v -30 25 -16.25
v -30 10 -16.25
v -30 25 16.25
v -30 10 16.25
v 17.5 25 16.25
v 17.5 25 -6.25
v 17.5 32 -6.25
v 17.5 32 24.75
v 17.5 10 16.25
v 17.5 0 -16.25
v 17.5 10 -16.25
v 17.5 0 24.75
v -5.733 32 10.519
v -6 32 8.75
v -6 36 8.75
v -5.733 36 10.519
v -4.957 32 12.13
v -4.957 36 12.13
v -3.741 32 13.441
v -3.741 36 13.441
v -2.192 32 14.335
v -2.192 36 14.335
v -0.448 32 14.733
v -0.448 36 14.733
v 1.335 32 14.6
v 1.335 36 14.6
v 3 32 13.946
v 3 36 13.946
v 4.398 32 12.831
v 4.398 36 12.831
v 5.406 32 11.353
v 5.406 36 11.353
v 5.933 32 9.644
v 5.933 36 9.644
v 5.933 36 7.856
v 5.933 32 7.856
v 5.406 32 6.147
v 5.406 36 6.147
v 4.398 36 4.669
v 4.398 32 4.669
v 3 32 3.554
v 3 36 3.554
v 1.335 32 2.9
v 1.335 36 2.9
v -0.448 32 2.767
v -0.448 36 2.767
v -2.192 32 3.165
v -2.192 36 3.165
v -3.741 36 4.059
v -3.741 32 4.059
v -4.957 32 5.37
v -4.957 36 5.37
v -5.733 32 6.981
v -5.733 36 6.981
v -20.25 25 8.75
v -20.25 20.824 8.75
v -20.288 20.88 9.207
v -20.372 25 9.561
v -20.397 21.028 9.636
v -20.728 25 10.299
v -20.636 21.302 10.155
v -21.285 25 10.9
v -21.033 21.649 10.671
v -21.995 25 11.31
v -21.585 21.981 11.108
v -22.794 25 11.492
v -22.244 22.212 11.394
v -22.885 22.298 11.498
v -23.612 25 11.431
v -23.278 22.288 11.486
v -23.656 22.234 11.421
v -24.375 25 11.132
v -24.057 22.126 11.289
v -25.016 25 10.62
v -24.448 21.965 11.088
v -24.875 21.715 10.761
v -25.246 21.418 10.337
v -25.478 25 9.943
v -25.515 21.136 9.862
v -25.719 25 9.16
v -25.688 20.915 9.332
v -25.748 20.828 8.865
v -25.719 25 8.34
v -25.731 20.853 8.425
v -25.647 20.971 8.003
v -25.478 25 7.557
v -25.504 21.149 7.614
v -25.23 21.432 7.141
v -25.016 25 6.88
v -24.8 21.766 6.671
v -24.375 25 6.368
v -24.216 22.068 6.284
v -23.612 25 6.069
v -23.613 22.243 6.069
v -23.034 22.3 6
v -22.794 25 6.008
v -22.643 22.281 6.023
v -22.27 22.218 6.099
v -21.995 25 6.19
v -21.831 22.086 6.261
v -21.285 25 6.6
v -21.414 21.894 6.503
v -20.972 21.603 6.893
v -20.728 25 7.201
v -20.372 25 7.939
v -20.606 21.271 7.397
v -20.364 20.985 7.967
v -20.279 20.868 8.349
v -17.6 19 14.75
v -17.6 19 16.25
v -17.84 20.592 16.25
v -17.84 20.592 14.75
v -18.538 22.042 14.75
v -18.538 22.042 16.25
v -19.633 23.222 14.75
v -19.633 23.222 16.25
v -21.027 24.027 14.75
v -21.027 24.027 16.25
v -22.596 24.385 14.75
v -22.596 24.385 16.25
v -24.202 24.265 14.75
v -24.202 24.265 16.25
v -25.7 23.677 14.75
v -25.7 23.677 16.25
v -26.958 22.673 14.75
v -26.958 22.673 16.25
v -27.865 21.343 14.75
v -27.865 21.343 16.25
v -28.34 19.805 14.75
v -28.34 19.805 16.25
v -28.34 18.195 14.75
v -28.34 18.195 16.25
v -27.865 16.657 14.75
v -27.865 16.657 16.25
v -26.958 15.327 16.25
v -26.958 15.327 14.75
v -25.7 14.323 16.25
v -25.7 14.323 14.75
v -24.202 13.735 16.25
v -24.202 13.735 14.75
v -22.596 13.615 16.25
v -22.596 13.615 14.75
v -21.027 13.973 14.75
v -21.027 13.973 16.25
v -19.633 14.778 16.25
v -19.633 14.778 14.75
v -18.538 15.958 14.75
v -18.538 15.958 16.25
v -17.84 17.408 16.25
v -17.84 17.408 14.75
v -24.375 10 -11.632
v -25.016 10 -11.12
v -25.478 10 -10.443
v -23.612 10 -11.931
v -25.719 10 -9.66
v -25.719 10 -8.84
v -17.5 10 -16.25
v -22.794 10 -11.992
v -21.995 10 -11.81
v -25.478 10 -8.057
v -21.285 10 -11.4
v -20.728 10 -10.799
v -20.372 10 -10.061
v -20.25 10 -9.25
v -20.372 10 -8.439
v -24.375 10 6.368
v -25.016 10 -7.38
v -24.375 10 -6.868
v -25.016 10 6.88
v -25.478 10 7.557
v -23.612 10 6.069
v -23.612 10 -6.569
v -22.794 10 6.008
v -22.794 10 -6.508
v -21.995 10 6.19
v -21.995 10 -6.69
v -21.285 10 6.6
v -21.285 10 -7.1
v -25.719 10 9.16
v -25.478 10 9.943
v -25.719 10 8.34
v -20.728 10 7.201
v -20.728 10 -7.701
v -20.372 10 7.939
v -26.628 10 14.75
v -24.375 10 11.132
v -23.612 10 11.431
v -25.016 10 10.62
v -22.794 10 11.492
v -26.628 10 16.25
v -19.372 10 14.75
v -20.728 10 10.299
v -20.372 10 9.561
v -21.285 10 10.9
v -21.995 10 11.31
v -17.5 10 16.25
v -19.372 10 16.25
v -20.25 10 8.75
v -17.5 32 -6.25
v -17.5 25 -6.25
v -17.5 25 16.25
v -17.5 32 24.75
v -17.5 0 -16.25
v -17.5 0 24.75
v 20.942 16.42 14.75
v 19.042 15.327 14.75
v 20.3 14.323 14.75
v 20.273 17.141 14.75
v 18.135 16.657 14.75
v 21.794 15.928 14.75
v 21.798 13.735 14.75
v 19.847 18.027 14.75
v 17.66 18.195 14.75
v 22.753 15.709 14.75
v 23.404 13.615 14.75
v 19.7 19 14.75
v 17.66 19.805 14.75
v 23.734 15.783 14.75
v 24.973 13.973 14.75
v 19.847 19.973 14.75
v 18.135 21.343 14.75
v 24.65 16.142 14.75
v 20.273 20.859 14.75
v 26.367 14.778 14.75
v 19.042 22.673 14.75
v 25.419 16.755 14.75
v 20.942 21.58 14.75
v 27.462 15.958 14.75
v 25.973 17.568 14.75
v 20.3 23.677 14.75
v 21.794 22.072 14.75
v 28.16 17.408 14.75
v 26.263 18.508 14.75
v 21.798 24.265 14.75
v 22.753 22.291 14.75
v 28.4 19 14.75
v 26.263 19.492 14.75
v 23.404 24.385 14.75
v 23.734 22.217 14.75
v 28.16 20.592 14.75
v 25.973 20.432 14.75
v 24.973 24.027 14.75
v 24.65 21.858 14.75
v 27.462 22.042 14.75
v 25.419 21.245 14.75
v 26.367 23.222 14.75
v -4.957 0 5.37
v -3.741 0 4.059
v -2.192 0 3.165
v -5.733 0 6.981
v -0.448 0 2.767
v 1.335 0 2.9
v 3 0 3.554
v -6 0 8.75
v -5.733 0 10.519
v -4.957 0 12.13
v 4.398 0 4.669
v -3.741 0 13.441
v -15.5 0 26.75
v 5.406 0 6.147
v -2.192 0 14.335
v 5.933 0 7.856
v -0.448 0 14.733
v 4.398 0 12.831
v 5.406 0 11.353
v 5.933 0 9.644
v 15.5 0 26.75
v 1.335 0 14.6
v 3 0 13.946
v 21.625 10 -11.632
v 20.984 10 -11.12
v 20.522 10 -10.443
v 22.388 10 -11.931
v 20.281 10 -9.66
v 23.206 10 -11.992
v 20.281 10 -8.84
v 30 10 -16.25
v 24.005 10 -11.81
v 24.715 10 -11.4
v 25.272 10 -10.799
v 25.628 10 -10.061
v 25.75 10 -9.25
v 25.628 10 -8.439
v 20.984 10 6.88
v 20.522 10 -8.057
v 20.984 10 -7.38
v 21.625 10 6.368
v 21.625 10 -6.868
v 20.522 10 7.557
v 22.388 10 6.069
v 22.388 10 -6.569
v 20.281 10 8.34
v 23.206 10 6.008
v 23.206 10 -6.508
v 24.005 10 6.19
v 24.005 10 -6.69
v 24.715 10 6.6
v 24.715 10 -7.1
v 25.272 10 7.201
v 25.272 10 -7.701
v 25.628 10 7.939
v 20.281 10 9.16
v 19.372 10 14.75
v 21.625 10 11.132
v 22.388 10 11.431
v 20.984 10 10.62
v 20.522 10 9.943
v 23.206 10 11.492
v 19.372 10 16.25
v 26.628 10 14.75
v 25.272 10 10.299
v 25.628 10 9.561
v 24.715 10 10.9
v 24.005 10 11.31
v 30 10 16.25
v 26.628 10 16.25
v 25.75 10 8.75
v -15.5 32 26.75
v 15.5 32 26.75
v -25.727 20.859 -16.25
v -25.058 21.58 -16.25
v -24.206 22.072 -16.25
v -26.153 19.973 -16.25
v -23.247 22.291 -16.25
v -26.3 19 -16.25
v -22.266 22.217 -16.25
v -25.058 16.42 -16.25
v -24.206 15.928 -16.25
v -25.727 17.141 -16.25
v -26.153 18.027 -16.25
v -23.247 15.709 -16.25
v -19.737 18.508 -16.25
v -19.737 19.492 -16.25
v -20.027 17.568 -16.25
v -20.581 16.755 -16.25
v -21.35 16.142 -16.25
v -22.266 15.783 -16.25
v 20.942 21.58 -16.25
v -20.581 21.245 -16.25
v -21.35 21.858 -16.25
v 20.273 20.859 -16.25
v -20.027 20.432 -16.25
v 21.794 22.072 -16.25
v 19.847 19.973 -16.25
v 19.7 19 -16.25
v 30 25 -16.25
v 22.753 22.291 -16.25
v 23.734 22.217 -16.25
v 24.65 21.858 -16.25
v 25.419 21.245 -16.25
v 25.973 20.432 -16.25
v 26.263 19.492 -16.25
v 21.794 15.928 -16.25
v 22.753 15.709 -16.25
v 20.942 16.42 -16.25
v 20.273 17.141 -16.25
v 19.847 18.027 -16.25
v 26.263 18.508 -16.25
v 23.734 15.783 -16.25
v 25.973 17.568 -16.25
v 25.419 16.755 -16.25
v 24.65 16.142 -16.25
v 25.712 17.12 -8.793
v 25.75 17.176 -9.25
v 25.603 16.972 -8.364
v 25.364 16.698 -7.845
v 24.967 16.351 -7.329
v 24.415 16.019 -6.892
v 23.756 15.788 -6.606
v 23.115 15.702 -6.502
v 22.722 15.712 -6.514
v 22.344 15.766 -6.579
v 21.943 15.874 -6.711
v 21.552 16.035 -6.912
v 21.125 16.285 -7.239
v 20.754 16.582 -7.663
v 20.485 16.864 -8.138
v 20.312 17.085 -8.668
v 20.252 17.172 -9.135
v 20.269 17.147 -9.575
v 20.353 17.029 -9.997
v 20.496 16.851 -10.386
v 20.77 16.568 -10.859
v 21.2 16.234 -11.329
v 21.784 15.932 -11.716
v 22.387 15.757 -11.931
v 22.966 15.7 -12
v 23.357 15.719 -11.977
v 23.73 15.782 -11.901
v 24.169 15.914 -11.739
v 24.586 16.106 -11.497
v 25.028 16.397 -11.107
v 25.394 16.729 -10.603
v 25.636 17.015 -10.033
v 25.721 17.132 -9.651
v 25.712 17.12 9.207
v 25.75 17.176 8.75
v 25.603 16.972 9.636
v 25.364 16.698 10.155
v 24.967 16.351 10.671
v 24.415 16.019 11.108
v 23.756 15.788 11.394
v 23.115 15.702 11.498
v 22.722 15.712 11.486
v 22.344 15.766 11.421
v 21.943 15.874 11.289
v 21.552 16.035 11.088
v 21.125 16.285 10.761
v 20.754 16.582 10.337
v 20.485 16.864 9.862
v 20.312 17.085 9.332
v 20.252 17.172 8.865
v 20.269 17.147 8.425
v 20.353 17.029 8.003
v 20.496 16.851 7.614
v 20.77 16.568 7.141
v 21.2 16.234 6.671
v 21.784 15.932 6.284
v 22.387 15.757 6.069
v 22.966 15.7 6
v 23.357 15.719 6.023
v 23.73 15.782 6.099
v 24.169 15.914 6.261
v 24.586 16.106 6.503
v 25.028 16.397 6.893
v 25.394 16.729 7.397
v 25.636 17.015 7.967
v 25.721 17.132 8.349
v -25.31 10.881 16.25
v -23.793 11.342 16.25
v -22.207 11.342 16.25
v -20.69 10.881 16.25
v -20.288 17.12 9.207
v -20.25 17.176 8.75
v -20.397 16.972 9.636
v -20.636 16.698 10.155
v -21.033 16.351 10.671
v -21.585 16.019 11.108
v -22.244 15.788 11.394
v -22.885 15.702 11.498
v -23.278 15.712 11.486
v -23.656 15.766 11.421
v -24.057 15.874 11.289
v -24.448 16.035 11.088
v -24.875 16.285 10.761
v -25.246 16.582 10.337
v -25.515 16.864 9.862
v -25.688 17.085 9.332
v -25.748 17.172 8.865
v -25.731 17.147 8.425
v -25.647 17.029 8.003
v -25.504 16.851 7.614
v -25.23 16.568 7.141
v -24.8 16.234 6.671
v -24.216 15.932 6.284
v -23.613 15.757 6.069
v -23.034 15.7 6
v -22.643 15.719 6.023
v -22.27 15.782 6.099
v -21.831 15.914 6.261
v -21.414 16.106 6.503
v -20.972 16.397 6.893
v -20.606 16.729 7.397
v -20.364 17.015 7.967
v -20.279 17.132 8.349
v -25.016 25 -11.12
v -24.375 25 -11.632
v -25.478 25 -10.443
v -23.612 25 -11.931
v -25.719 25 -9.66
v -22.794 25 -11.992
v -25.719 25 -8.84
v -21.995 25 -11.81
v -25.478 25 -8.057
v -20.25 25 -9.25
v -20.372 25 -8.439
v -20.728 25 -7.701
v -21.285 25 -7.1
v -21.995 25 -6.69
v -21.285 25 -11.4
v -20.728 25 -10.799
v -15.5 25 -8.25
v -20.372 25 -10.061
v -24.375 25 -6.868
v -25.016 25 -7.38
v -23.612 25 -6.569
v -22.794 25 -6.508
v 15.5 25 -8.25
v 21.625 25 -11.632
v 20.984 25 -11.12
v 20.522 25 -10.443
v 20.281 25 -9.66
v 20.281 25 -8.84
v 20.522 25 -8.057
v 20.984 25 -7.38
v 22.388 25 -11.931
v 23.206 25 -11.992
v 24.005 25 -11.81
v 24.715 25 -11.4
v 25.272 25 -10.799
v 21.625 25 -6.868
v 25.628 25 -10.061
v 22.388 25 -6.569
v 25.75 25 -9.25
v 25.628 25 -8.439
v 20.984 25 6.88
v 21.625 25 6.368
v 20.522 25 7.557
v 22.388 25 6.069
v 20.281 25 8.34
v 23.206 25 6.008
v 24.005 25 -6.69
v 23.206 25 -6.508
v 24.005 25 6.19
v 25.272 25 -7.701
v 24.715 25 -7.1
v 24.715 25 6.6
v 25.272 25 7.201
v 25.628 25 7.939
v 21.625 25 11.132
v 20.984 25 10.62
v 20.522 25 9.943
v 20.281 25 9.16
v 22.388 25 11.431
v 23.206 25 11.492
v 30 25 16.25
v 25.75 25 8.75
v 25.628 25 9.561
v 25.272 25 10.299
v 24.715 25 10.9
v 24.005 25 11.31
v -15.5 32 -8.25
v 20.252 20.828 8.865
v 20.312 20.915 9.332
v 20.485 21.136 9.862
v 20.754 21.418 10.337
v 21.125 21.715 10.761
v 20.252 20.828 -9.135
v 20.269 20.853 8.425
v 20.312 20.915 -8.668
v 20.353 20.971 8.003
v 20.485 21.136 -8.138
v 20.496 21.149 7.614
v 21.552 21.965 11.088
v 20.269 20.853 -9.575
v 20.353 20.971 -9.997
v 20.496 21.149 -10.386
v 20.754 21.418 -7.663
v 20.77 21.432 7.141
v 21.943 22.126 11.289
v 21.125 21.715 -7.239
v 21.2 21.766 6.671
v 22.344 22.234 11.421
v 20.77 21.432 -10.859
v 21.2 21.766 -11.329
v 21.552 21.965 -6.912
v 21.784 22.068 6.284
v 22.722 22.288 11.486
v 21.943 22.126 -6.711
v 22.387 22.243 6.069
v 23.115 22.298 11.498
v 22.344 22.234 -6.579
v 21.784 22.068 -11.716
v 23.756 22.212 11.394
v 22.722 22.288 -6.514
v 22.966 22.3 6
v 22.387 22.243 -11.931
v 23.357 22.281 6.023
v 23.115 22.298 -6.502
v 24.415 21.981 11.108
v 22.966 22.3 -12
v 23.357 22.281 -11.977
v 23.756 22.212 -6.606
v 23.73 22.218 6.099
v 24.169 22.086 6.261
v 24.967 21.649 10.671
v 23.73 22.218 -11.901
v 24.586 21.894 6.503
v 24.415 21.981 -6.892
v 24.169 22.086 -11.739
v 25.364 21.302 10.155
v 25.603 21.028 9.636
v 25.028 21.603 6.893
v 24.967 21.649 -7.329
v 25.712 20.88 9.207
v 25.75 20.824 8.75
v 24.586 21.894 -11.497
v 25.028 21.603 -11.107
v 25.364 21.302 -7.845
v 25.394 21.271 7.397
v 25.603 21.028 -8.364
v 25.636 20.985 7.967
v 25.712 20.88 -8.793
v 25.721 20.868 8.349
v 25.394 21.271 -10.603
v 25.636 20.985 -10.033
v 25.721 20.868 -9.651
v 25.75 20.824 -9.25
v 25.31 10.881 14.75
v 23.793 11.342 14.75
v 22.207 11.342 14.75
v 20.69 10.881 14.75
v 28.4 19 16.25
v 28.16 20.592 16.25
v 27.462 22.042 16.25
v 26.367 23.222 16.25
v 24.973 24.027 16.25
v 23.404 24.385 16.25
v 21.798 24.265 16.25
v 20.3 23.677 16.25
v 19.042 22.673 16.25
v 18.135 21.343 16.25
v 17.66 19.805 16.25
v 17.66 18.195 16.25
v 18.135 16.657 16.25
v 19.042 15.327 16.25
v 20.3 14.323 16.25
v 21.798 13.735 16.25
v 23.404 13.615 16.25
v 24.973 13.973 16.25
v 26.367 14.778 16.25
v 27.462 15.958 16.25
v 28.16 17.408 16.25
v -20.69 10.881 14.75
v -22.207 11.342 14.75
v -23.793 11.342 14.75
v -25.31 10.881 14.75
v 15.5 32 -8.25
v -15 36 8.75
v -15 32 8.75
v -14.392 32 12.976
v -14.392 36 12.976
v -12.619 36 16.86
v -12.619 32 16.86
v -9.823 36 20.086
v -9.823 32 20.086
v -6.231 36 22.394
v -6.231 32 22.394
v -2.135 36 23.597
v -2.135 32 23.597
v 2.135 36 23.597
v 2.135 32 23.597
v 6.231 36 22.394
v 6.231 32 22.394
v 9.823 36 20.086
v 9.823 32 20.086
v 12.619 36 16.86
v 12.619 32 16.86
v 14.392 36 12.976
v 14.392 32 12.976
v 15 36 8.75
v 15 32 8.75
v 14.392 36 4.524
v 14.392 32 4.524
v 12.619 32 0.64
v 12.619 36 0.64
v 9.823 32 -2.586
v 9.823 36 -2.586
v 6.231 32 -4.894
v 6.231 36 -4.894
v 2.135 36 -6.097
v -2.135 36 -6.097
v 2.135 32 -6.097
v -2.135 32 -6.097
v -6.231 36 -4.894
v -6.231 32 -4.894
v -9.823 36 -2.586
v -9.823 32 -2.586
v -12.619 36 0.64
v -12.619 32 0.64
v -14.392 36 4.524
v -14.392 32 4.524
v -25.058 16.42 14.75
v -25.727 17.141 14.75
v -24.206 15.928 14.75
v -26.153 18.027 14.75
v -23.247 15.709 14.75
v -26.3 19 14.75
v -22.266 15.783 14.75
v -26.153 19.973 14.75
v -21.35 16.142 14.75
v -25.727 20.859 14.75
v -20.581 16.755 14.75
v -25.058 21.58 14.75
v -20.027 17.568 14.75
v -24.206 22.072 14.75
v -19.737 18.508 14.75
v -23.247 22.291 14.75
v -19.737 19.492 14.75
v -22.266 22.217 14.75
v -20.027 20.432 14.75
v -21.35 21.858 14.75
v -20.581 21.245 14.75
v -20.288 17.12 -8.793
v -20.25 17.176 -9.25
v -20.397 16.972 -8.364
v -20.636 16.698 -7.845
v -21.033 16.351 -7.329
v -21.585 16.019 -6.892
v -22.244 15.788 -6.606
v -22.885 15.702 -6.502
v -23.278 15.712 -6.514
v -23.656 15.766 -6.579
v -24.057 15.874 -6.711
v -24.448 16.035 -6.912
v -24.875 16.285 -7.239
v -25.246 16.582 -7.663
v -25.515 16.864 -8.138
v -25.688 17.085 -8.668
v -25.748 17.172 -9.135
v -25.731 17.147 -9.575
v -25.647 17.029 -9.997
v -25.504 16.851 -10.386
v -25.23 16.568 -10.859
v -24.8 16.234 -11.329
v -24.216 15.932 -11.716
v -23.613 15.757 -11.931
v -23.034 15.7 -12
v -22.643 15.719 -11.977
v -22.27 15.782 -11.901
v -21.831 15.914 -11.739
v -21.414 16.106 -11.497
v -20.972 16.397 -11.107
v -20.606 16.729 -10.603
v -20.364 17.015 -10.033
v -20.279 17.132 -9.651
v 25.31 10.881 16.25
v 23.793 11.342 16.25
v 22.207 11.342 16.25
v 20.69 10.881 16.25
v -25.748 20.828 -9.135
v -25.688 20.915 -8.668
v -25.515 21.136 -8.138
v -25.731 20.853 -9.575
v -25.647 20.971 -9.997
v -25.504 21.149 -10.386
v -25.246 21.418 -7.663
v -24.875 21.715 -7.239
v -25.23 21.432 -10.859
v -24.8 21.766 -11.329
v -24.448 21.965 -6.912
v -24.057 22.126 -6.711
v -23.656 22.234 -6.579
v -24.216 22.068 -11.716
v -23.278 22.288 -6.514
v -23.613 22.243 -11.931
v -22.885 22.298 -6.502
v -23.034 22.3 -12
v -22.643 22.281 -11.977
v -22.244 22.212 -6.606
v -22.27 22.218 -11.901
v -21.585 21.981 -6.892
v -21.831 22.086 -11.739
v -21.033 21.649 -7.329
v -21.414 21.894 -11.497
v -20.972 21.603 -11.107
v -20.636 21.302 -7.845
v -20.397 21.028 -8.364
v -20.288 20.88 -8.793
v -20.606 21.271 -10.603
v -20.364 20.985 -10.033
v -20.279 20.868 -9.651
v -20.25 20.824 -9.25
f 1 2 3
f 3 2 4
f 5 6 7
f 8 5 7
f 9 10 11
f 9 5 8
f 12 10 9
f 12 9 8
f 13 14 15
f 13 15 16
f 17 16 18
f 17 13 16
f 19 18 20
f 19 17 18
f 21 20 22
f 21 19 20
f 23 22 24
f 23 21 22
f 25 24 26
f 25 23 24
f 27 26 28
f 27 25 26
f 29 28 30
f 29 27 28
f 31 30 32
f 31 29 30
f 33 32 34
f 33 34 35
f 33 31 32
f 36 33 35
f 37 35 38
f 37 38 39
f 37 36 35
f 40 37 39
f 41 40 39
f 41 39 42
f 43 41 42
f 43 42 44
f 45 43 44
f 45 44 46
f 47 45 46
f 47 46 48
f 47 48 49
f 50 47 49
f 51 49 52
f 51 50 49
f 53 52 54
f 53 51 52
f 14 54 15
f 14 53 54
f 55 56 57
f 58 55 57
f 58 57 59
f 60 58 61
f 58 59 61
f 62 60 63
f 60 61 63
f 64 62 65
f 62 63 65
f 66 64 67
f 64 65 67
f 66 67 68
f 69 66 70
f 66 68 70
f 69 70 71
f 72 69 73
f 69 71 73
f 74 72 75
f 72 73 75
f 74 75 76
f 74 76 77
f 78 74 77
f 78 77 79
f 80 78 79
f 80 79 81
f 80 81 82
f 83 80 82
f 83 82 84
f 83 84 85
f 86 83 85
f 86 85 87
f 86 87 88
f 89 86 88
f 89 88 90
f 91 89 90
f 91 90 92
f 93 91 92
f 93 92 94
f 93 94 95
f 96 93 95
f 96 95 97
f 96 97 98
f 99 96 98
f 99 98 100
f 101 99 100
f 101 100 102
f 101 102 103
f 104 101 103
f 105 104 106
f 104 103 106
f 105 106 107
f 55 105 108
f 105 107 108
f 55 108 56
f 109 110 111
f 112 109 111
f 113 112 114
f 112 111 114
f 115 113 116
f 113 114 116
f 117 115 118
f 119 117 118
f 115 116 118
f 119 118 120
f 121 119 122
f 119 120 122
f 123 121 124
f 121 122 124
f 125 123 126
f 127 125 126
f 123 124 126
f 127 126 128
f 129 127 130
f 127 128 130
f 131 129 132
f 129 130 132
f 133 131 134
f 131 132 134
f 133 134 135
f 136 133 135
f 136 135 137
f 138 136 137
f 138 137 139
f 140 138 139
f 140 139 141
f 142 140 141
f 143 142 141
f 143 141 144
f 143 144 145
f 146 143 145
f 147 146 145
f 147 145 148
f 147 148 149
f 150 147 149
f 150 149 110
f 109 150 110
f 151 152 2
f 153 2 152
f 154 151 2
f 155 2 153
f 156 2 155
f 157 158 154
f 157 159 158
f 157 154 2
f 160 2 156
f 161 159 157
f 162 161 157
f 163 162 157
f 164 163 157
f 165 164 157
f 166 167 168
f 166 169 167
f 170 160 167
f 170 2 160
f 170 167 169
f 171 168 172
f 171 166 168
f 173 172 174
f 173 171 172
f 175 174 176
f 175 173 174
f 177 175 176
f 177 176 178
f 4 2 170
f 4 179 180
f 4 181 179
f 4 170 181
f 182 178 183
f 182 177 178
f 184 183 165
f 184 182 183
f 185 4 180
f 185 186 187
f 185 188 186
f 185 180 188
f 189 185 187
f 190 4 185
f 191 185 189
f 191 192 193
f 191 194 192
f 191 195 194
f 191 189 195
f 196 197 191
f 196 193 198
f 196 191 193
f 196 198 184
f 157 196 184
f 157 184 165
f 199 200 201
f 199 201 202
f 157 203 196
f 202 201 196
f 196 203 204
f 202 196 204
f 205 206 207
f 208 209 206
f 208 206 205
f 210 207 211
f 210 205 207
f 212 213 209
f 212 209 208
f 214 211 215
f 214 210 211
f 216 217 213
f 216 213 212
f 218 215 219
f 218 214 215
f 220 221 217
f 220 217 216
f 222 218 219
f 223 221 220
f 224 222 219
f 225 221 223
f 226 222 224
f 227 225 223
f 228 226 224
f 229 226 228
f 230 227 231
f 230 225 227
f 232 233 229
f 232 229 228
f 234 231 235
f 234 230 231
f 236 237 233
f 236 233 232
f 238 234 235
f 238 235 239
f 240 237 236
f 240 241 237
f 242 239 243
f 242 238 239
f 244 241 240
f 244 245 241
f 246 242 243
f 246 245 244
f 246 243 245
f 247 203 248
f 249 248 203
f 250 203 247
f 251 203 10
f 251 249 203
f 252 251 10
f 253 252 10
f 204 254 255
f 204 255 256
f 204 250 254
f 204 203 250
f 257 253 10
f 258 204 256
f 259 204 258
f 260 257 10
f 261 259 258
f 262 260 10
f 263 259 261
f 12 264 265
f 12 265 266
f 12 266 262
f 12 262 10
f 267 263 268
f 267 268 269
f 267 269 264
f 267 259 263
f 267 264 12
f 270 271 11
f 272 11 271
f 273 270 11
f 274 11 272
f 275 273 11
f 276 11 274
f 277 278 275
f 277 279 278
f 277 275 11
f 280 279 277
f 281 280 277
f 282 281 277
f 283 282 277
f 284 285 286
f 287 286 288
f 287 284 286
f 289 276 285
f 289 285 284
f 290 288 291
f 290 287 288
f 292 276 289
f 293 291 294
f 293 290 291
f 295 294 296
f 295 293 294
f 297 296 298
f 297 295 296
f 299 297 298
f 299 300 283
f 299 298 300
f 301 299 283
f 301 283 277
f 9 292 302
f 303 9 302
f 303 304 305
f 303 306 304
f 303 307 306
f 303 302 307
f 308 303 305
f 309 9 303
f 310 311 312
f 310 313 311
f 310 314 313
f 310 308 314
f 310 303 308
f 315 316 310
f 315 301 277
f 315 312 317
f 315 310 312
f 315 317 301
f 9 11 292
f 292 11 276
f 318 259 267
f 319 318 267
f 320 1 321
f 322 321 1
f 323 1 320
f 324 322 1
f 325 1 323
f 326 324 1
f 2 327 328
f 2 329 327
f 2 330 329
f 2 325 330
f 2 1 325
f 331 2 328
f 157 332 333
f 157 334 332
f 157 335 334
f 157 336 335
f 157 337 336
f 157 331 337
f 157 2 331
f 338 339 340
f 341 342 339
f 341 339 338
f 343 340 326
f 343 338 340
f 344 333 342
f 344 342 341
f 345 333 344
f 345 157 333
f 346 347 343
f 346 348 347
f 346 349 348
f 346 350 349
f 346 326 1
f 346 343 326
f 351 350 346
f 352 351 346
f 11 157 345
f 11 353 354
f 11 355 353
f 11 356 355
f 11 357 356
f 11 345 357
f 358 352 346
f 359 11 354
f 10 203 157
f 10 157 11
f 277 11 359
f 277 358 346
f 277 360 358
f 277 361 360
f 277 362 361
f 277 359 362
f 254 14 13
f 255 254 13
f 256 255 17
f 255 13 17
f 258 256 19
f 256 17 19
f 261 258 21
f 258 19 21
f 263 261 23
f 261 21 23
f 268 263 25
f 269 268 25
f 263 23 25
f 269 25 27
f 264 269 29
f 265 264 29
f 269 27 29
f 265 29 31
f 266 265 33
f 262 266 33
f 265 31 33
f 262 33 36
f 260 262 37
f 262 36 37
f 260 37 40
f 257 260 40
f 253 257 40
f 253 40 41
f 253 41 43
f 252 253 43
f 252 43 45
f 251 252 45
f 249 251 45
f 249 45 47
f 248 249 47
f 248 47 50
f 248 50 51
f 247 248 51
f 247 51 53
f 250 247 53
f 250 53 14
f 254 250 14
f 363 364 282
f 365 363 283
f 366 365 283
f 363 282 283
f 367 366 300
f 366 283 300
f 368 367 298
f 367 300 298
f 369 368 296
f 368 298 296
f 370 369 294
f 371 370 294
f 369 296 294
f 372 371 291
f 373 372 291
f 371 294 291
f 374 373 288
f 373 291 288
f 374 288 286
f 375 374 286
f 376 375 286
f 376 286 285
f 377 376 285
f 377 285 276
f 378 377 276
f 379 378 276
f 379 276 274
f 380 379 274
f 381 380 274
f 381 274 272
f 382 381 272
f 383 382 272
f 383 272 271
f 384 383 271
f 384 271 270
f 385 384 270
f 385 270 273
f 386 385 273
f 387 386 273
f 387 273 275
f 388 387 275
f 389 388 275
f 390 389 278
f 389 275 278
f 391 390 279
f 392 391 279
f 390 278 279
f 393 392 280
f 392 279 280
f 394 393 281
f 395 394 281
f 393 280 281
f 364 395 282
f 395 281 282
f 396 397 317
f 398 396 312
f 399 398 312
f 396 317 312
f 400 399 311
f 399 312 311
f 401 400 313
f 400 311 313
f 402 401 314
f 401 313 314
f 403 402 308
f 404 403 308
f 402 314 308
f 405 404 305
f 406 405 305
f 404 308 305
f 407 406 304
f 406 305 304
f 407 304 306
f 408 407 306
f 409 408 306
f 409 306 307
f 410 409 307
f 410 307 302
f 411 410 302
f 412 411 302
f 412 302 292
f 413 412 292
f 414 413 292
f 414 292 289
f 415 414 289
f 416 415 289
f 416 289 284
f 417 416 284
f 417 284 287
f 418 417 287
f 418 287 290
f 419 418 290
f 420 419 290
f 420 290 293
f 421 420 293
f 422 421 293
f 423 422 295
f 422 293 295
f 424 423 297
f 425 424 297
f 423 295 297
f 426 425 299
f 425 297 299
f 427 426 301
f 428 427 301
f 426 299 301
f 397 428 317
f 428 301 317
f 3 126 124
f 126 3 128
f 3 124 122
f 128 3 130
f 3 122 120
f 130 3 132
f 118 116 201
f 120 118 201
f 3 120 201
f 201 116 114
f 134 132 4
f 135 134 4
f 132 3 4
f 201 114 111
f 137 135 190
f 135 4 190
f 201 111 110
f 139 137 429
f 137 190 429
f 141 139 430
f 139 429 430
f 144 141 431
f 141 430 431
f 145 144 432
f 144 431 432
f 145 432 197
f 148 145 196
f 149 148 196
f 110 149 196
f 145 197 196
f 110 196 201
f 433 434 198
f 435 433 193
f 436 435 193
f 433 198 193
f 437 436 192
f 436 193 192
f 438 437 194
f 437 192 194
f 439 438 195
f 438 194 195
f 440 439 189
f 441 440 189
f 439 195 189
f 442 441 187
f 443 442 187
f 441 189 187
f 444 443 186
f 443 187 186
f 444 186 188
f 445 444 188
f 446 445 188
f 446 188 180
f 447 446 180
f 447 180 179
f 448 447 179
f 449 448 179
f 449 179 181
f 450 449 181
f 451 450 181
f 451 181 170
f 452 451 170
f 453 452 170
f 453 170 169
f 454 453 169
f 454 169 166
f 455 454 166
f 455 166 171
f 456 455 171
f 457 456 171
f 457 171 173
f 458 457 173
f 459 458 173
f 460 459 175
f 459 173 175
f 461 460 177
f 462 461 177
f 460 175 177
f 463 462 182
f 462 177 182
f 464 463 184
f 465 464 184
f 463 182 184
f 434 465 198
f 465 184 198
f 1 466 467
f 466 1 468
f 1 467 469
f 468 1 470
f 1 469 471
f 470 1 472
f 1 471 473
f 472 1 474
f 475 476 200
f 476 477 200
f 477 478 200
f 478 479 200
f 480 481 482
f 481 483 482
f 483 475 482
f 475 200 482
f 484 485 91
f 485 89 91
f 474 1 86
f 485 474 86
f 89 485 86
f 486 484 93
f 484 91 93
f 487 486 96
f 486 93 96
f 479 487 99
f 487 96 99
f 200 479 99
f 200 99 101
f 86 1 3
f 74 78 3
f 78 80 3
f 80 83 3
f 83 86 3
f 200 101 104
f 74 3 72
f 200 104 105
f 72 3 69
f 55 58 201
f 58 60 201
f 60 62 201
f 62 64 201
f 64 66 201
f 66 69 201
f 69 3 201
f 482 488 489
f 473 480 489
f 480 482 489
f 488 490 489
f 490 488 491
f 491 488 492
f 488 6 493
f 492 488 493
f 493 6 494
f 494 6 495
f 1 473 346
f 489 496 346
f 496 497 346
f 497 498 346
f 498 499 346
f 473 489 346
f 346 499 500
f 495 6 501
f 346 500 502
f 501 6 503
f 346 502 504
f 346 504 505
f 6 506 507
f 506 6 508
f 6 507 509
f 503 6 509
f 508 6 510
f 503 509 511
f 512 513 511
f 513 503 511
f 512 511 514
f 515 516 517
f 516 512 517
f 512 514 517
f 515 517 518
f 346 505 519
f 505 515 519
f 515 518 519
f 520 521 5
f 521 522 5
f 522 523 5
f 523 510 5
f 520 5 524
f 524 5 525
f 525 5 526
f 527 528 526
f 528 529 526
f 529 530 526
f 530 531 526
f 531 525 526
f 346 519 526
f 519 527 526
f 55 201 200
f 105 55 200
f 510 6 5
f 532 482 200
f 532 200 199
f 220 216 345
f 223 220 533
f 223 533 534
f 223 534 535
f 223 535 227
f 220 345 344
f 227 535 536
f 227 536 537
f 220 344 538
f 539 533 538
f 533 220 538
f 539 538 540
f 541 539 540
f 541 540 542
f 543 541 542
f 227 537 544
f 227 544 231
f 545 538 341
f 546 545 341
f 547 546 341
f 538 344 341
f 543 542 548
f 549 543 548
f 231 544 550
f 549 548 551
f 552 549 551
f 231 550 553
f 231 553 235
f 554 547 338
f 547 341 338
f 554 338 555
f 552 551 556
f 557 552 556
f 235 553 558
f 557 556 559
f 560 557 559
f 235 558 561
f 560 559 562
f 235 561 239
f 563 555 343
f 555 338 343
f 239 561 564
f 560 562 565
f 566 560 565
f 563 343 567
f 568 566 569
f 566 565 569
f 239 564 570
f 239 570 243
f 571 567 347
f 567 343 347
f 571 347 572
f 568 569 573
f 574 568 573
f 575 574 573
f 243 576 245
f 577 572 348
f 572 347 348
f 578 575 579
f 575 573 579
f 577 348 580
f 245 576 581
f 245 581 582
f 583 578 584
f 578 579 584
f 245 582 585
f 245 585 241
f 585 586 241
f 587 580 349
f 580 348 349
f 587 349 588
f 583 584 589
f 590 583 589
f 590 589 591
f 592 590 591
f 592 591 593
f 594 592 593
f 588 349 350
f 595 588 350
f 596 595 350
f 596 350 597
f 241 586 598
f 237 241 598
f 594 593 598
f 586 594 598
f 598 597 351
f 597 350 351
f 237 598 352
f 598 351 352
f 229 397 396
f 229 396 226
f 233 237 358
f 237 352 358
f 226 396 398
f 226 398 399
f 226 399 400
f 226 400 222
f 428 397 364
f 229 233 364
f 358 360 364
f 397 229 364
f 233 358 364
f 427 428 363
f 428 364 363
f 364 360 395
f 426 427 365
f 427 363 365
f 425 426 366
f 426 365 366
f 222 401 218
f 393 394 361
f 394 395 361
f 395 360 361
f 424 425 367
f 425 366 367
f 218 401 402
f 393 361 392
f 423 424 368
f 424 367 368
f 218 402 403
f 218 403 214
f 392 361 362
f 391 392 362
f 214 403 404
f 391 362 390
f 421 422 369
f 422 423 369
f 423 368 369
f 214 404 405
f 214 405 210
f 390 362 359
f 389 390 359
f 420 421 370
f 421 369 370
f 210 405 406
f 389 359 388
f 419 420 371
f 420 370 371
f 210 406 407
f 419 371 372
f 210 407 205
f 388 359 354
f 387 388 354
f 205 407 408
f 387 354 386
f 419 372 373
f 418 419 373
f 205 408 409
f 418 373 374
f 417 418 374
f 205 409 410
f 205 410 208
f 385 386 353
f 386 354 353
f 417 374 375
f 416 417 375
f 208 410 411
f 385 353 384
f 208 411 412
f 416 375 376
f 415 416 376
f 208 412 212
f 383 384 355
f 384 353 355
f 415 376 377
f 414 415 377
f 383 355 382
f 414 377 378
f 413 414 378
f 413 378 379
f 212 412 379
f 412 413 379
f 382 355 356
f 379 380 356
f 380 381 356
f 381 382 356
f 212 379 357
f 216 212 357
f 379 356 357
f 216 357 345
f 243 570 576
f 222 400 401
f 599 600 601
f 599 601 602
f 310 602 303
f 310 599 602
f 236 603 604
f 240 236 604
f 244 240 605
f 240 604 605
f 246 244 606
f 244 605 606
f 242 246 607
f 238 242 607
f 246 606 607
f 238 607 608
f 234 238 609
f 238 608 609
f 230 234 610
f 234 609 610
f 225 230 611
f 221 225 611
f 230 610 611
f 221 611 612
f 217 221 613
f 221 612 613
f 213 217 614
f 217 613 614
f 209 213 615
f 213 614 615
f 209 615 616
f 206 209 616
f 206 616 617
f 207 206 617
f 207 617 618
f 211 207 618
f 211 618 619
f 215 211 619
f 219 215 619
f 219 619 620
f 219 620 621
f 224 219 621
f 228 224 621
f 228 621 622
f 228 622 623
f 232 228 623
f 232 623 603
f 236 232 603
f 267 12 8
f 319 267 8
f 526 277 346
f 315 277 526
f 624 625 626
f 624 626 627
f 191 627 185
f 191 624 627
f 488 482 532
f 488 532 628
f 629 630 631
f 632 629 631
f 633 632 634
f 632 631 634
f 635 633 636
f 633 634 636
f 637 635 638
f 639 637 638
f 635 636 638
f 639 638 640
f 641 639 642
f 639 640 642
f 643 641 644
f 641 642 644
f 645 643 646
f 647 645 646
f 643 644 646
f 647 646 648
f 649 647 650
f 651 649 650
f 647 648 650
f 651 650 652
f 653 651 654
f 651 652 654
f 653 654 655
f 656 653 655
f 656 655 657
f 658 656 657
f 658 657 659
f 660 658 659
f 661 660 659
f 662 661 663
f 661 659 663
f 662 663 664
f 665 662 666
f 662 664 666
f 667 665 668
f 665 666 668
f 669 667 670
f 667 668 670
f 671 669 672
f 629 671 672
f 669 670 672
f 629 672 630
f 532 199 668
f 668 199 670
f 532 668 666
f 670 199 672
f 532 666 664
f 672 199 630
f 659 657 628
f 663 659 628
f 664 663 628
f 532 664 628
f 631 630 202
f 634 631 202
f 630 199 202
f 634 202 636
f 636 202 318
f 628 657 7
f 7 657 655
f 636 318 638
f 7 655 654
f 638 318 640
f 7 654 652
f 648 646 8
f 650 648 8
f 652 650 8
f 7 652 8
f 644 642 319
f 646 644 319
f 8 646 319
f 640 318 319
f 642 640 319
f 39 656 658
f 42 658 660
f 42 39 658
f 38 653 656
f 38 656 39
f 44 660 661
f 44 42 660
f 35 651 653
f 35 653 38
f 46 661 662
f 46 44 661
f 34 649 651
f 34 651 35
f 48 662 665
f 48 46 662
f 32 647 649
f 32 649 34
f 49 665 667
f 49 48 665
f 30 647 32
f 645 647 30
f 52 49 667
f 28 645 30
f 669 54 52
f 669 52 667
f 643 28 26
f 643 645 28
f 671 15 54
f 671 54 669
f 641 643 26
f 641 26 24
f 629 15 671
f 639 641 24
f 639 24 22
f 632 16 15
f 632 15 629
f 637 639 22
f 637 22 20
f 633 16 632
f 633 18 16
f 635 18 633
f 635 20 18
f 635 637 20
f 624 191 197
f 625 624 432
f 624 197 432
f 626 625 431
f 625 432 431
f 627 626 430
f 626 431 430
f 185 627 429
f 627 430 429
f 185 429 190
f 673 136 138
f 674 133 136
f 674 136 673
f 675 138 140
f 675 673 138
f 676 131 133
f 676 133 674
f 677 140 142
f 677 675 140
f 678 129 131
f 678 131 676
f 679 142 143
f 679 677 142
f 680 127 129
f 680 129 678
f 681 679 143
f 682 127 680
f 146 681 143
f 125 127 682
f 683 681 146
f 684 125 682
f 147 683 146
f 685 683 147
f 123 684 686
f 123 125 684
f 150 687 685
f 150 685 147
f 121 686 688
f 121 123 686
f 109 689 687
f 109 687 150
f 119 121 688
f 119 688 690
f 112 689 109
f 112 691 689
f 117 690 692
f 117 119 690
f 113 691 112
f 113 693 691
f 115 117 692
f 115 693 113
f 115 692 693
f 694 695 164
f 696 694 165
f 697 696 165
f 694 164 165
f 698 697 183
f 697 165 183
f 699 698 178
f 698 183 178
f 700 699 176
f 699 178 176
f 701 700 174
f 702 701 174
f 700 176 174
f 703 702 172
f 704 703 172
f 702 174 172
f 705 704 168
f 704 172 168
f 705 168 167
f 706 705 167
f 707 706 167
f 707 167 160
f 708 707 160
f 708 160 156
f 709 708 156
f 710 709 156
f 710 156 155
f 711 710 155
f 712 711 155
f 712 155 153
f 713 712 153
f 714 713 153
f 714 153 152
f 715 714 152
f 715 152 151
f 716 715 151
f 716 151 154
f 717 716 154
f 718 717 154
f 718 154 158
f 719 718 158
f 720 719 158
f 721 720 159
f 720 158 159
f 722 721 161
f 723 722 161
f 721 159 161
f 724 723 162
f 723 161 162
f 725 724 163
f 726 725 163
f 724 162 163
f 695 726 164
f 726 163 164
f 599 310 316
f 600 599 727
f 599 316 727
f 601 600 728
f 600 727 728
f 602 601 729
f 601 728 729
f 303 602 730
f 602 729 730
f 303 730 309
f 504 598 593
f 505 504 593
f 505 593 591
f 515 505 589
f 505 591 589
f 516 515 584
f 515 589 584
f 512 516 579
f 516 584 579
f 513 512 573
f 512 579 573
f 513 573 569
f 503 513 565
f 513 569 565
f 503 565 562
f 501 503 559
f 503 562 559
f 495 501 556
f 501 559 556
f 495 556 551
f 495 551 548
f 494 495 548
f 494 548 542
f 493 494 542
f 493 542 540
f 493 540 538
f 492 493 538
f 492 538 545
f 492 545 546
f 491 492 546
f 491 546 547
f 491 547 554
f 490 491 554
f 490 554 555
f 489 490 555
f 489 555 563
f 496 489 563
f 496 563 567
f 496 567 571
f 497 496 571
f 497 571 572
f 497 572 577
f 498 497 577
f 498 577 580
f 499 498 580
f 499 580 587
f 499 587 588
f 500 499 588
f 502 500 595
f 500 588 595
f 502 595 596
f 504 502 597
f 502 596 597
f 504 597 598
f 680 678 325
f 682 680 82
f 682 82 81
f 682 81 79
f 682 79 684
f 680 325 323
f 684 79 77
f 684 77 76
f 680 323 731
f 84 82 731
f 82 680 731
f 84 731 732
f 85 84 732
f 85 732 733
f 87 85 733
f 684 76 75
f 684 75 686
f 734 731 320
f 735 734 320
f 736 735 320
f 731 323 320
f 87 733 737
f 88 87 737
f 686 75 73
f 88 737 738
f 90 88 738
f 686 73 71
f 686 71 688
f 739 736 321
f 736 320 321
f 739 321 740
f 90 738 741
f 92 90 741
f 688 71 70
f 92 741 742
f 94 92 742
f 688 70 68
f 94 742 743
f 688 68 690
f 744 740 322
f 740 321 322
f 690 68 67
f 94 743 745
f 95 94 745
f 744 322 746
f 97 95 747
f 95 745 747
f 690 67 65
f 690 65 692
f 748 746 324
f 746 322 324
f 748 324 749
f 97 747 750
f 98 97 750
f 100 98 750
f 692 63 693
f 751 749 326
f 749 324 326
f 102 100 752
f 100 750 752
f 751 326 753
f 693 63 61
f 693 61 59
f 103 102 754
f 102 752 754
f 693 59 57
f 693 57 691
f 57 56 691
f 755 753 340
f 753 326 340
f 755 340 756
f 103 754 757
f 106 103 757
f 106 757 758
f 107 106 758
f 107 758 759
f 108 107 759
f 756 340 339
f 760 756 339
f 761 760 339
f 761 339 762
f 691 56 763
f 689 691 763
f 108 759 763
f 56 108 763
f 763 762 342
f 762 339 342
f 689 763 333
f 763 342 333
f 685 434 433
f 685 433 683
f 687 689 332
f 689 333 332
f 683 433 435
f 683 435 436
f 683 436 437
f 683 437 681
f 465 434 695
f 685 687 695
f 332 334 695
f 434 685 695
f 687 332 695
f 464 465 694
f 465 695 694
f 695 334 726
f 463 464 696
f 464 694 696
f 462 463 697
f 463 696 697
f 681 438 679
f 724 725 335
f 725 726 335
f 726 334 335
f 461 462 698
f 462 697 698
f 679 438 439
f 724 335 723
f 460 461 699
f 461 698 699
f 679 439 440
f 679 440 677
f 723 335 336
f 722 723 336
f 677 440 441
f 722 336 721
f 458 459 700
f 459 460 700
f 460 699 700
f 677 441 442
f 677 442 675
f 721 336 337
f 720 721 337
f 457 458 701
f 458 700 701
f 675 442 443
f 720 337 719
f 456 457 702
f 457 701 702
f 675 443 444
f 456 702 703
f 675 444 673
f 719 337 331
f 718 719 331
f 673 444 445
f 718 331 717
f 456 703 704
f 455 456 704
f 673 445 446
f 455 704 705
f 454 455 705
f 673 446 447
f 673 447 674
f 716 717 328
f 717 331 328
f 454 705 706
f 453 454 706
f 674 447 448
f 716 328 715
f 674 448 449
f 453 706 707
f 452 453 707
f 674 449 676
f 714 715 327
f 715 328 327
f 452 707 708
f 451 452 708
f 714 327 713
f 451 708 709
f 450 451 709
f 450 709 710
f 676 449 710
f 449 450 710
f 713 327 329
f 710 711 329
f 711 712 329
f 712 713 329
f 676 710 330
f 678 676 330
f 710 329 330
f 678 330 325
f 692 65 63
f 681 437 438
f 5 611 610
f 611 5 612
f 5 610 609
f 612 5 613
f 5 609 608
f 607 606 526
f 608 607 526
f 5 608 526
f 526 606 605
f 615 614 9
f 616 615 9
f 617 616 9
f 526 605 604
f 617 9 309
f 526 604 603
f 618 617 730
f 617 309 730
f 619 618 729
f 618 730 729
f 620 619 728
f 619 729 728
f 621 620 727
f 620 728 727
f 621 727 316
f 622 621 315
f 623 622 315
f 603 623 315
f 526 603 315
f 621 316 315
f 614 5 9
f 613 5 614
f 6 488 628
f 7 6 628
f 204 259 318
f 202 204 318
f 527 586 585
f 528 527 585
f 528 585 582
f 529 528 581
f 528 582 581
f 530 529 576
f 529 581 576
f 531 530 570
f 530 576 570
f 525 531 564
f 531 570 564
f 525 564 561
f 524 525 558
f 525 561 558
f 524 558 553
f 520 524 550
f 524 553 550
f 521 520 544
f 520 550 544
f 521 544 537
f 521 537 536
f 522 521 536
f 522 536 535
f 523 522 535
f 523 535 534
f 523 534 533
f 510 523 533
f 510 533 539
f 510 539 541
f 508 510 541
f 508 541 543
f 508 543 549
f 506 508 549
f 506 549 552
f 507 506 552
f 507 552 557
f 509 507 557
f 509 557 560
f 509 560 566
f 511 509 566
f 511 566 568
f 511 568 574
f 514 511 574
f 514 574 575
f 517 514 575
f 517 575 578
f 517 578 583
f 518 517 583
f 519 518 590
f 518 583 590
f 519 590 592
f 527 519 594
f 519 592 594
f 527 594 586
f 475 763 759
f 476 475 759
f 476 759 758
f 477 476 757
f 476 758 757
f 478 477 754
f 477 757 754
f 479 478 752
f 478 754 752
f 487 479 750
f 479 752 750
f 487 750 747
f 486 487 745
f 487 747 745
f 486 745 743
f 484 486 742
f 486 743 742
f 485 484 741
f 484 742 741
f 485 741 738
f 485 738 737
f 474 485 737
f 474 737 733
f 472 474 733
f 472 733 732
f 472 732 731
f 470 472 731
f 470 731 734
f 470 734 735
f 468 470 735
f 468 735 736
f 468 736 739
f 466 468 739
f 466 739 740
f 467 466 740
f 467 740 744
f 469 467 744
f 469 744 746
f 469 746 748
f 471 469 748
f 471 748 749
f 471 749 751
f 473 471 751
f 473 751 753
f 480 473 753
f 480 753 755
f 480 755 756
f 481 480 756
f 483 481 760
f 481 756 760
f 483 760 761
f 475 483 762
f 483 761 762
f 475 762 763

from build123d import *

# Parameters (mm, degrees)
F10_W          = 60
F10_H          = 32.5
F11_DEPTH      = 25
F0_W           = 35
F0_H           = 35
F12_DEPTH      = 32
F1_R           = 6
F13_DEPTH      = 32.001
F2_SIZE        = 2
F3_R           = 2.75
F14_DEPTH      = 32.001
F4_SIZE        = 2
F6_D           = 6.6
F6_CBORE_D     = 10.8
F6_CBORE_DEPTH = 1.5
F15_R          = 15
F15_R_2        = 6
F7_DEPTH       = 4
F8_W           = 12.5
F8_H           = 32.5
F9_DEPTH       = 10


with BuildPart() as f11:
    # F10 (on Front) → F11 (new body)
    with BuildSketch(Plane.XZ):
        Rectangle(F10_W, F10_H)
    extrude(amount=-F11_DEPTH)

    # F0 (on Front) → F12 (join)
    with BuildSketch(Plane.XZ):
        with Locations((0, 9.25)):
            Rectangle(F0_W, F0_H)
    extrude(amount=-F12_DEPTH)

    # F1 (on face) → F13 (cut, through all)
    with BuildSketch(Plane(origin=(0, 32, 0), x_dir=(-1, 0, 0), z_dir=(0, 1, 0))):
        with Locations((0, 8.75)):
            Circle(F1_R)
    extrude(amount=-F13_DEPTH, mode=Mode.SUBTRACT)

    # F2
    f2_edges = [f11.edges().sort_by_distance(p)[0] for p in [
        (-17.5, 16, 26.75),
        (17.5, 16, 26.75),
    ]]
    chamfer(f2_edges, length=F2_SIZE)

    # F3 (on Front) → F14 (cut, through all)
    with BuildSketch(Plane.XZ):
        with Locations((23, -9.25)):
            Circle(F3_R)
        with Locations((23, 8.75)):
            Circle(F3_R)
        with Locations((-23, 8.75)):
            Circle(F3_R)
        with Locations((-23, -9.25)):
            Circle(F3_R)
    extrude(amount=-F14_DEPTH, mode=Mode.SUBTRACT)

    # F4
    f4_edges = [f11.edges().sort_by_distance(p)[0] for p in [
        (-17.5, 28.5, -8.25),
        (17.5, 28.5, -8.25),
    ]]
    chamfer(f4_edges, length=F4_SIZE)

    # F6 (through all)
    with Locations(Plane.XY.offset(16.25)):
        with Locations((-23, 6), (-23, 19), (23, 6), (23, 19)):
            CounterBoreHole(F6_D / 2, F6_CBORE_D / 2, F6_CBORE_DEPTH)

    # F15 (on face) → F7 (join)
    with BuildSketch(Plane(origin=(0, 32, 0), x_dir=(-1, 0, 0), z_dir=(0, 1, 0))):
        with Locations((0, 8.75)):
            Circle(F15_R)
        with Locations((0, 8.75)):
            Circle(F15_R_2, mode=Mode.SUBTRACT)
    extrude(amount=F7_DEPTH)

    # F8 (on face) → F9 (cut)
    with BuildSketch(Plane.XZ):
        with Locations((-23.75, 0)):
            Rectangle(F8_W, F8_H)
        with Locations((23.75, 0)):
            Rectangle(F8_W, F8_H)
    extrude(amount=-F9_DEPTH, mode=Mode.SUBTRACT)


solid = f11.part
